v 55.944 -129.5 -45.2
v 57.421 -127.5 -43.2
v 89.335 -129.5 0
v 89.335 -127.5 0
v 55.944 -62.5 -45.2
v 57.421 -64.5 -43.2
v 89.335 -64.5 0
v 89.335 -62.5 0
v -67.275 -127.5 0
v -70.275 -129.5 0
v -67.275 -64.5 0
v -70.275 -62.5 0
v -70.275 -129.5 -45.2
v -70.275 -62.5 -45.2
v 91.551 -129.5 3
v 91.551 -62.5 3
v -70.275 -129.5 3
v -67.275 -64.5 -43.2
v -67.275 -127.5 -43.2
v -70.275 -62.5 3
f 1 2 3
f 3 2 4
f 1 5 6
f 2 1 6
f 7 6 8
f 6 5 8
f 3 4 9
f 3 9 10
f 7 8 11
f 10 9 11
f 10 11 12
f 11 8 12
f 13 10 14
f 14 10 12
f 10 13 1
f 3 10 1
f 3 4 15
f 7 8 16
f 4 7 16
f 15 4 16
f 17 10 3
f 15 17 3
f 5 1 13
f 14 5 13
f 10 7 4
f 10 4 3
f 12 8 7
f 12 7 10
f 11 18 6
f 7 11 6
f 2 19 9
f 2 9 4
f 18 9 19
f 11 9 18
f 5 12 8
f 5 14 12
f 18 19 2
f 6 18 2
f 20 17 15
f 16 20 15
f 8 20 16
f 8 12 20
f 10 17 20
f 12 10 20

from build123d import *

# Parameters (mm, degrees)
SZKIC1_W                        = 157.665871289
SZKIC1_H                        = 63
DODANIE_WYCI_GNI_CIE1_DEPTH     = 43.2
WYTNIJ_WYCI_GNI_CIE1_DEPTH      = 70
SKORUPA3_START                  = -70.275069684
SKORUPA3_OUTLINE_W              = 67
SKORUPA3_OUTLINE_H              = 48.2
SKORUPA3_DEPTH                  = 3
SKORUPA3_START_2                = -127.5
SKORUPA3_2_DEPTH                = 63
SKORUPA3_START_3                = -129.5
SKORUPA3_3_DEPTH                = 67
SKORUPA3_4_DEPTH                = 2
SKORUPA3_START_4                = -64.5
SKORUPA3_5_DEPTH                = 2
WYTNIJ_WYCI_GNI_CIE3_DEPTH      = 125.94228845
WYTNIJ_WYCI_GNI_CIE3_DEPTH_BACK = 125.94228845


with BuildPart() as part:
    # Szkic1 → Dodanie-wyciągnięcie1 (new body)
    with BuildSketch(Plane.XY):
        with Locations((11.557865961, -96)):
            Rectangle(SZKIC1_W, SZKIC1_H)
    extrude(amount=-DODANIE_WYCI_GNI_CIE1_DEPTH)

    # Szkic2 → Wytnij-wyciągnięcie1 (cut)
    with BuildSketch(Plane.XZ.offset(127.5)):
        Polygon((91.579553956, 3.037978518), (97.149949113, -5.556810967), (99.754808073, -53.374579011), (51.257151272, -51.543792256), align=None)
    extrude(amount=-WYTNIJ_WYCI_GNI_CIE1_DEPTH, mode=Mode.SUBTRACT)

    # Skorupa3: read off the stored shape, not the designer's step
    # Skorupa3 outline → Skorupa3 (add)
    with BuildSketch(Plane.YZ.offset(SKORUPA3_START)):
        with Locations((-96, -21.1)):
            Rectangle(SKORUPA3_OUTLINE_W, SKORUPA3_OUTLINE_H)
    extrude(amount=SKORUPA3_DEPTH)

    # Skorupa3 2 outline → Skorupa3 2 (cut)
    with BuildSketch(Plane(origin=(0, 0, 0), x_dir=(1, 0, 0), z_dir=(0, 1, 0)).offset(SKORUPA3_START_2)):
        Polygon((57.421146073, 43.2), (-67.275069684, 43.2), (-67.275069684, 0), (89.335240673, 0), align=None)
    extrude(amount=SKORUPA3_2_DEPTH, mode=Mode.SUBTRACT)

    # Skorupa3 3 outline → Skorupa3 3 (add)
    with BuildSketch(Plane(origin=(0, 0, 0), x_dir=(1, 0, 0), z_dir=(0, 1, 0)).offset(SKORUPA3_START_3)):
        Polygon((95.281348873, -3), (59.673493323, 45.2), (-67.275069684, 45.2), (-67.275069684, 43.2), (57.421146073, 43.2), (89.335240673, 0), (-67.275069684, 0), (-67.275069684, -3), align=None)
    extrude(amount=SKORUPA3_3_DEPTH)

    # Skorupa3 4 outline → Skorupa3 4 (add)
    with BuildSketch(Plane(origin=(0, 0, 0), x_dir=(1, 0, 0), z_dir=(0, 1, 0)).offset(SKORUPA3_START_3)):
        Polygon((57.421146073, 43.2), (-67.275069684, 43.2), (-67.275069684, 0), (89.335240673, 0), align=None)
    extrude(amount=SKORUPA3_4_DEPTH)

    # Skorupa3 5 outline → Skorupa3 5 (add)
    with BuildSketch(Plane(origin=(0, 0, 0), x_dir=(1, 0, 0), z_dir=(0, 1, 0)).offset(SKORUPA3_START_4)):
        Polygon((57.421146073, 43.2), (-67.275069684, 43.2), (-67.275069684, 0), (89.335240673, 0), align=None)
    extrude(amount=SKORUPA3_5_DEPTH)

    # Szkic6 → Wytnij-wyciągnięcie3 (cut, two sides: drawn at the far end of the back side and taken through both)
    with BuildSketch(Plane.XZ.offset(129.5).offset(-WYTNIJ_WYCI_GNI_CIE3_DEPTH_BACK)):
        Polygon((-150.660373393, -324.866196497), (55.943641693, -45.2), (91.551497243, 3), (298.155512329, 282.666196497), (857.487905323, -130.541833674), (408.672019601, -738.074226668), align=None)
    extrude(amount=WYTNIJ_WYCI_GNI_CIE3_DEPTH + WYTNIJ_WYCI_GNI_CIE3_DEPTH_BACK, mode=Mode.SUBTRACT)


with BuildPart() as body_2:
    # Podziel3: the piece on the far side of the plane
    add(part.part)
    split(bisect_by=Plane(origin=(0, 0, 0), x_dir=(-1, 0, 0), z_dir=(0, 0, -1)), keep=Keep.BOTTOM)


with BuildPart() as part_1:
    add(part.part)

    # Podziel3
    split(bisect_by=Plane(origin=(0, 0, 0), x_dir=(-1, 0, 0), z_dir=(0, 0, -1)), keep=Keep.TOP)


solid = Compound([body_2.part, part_1.part])
